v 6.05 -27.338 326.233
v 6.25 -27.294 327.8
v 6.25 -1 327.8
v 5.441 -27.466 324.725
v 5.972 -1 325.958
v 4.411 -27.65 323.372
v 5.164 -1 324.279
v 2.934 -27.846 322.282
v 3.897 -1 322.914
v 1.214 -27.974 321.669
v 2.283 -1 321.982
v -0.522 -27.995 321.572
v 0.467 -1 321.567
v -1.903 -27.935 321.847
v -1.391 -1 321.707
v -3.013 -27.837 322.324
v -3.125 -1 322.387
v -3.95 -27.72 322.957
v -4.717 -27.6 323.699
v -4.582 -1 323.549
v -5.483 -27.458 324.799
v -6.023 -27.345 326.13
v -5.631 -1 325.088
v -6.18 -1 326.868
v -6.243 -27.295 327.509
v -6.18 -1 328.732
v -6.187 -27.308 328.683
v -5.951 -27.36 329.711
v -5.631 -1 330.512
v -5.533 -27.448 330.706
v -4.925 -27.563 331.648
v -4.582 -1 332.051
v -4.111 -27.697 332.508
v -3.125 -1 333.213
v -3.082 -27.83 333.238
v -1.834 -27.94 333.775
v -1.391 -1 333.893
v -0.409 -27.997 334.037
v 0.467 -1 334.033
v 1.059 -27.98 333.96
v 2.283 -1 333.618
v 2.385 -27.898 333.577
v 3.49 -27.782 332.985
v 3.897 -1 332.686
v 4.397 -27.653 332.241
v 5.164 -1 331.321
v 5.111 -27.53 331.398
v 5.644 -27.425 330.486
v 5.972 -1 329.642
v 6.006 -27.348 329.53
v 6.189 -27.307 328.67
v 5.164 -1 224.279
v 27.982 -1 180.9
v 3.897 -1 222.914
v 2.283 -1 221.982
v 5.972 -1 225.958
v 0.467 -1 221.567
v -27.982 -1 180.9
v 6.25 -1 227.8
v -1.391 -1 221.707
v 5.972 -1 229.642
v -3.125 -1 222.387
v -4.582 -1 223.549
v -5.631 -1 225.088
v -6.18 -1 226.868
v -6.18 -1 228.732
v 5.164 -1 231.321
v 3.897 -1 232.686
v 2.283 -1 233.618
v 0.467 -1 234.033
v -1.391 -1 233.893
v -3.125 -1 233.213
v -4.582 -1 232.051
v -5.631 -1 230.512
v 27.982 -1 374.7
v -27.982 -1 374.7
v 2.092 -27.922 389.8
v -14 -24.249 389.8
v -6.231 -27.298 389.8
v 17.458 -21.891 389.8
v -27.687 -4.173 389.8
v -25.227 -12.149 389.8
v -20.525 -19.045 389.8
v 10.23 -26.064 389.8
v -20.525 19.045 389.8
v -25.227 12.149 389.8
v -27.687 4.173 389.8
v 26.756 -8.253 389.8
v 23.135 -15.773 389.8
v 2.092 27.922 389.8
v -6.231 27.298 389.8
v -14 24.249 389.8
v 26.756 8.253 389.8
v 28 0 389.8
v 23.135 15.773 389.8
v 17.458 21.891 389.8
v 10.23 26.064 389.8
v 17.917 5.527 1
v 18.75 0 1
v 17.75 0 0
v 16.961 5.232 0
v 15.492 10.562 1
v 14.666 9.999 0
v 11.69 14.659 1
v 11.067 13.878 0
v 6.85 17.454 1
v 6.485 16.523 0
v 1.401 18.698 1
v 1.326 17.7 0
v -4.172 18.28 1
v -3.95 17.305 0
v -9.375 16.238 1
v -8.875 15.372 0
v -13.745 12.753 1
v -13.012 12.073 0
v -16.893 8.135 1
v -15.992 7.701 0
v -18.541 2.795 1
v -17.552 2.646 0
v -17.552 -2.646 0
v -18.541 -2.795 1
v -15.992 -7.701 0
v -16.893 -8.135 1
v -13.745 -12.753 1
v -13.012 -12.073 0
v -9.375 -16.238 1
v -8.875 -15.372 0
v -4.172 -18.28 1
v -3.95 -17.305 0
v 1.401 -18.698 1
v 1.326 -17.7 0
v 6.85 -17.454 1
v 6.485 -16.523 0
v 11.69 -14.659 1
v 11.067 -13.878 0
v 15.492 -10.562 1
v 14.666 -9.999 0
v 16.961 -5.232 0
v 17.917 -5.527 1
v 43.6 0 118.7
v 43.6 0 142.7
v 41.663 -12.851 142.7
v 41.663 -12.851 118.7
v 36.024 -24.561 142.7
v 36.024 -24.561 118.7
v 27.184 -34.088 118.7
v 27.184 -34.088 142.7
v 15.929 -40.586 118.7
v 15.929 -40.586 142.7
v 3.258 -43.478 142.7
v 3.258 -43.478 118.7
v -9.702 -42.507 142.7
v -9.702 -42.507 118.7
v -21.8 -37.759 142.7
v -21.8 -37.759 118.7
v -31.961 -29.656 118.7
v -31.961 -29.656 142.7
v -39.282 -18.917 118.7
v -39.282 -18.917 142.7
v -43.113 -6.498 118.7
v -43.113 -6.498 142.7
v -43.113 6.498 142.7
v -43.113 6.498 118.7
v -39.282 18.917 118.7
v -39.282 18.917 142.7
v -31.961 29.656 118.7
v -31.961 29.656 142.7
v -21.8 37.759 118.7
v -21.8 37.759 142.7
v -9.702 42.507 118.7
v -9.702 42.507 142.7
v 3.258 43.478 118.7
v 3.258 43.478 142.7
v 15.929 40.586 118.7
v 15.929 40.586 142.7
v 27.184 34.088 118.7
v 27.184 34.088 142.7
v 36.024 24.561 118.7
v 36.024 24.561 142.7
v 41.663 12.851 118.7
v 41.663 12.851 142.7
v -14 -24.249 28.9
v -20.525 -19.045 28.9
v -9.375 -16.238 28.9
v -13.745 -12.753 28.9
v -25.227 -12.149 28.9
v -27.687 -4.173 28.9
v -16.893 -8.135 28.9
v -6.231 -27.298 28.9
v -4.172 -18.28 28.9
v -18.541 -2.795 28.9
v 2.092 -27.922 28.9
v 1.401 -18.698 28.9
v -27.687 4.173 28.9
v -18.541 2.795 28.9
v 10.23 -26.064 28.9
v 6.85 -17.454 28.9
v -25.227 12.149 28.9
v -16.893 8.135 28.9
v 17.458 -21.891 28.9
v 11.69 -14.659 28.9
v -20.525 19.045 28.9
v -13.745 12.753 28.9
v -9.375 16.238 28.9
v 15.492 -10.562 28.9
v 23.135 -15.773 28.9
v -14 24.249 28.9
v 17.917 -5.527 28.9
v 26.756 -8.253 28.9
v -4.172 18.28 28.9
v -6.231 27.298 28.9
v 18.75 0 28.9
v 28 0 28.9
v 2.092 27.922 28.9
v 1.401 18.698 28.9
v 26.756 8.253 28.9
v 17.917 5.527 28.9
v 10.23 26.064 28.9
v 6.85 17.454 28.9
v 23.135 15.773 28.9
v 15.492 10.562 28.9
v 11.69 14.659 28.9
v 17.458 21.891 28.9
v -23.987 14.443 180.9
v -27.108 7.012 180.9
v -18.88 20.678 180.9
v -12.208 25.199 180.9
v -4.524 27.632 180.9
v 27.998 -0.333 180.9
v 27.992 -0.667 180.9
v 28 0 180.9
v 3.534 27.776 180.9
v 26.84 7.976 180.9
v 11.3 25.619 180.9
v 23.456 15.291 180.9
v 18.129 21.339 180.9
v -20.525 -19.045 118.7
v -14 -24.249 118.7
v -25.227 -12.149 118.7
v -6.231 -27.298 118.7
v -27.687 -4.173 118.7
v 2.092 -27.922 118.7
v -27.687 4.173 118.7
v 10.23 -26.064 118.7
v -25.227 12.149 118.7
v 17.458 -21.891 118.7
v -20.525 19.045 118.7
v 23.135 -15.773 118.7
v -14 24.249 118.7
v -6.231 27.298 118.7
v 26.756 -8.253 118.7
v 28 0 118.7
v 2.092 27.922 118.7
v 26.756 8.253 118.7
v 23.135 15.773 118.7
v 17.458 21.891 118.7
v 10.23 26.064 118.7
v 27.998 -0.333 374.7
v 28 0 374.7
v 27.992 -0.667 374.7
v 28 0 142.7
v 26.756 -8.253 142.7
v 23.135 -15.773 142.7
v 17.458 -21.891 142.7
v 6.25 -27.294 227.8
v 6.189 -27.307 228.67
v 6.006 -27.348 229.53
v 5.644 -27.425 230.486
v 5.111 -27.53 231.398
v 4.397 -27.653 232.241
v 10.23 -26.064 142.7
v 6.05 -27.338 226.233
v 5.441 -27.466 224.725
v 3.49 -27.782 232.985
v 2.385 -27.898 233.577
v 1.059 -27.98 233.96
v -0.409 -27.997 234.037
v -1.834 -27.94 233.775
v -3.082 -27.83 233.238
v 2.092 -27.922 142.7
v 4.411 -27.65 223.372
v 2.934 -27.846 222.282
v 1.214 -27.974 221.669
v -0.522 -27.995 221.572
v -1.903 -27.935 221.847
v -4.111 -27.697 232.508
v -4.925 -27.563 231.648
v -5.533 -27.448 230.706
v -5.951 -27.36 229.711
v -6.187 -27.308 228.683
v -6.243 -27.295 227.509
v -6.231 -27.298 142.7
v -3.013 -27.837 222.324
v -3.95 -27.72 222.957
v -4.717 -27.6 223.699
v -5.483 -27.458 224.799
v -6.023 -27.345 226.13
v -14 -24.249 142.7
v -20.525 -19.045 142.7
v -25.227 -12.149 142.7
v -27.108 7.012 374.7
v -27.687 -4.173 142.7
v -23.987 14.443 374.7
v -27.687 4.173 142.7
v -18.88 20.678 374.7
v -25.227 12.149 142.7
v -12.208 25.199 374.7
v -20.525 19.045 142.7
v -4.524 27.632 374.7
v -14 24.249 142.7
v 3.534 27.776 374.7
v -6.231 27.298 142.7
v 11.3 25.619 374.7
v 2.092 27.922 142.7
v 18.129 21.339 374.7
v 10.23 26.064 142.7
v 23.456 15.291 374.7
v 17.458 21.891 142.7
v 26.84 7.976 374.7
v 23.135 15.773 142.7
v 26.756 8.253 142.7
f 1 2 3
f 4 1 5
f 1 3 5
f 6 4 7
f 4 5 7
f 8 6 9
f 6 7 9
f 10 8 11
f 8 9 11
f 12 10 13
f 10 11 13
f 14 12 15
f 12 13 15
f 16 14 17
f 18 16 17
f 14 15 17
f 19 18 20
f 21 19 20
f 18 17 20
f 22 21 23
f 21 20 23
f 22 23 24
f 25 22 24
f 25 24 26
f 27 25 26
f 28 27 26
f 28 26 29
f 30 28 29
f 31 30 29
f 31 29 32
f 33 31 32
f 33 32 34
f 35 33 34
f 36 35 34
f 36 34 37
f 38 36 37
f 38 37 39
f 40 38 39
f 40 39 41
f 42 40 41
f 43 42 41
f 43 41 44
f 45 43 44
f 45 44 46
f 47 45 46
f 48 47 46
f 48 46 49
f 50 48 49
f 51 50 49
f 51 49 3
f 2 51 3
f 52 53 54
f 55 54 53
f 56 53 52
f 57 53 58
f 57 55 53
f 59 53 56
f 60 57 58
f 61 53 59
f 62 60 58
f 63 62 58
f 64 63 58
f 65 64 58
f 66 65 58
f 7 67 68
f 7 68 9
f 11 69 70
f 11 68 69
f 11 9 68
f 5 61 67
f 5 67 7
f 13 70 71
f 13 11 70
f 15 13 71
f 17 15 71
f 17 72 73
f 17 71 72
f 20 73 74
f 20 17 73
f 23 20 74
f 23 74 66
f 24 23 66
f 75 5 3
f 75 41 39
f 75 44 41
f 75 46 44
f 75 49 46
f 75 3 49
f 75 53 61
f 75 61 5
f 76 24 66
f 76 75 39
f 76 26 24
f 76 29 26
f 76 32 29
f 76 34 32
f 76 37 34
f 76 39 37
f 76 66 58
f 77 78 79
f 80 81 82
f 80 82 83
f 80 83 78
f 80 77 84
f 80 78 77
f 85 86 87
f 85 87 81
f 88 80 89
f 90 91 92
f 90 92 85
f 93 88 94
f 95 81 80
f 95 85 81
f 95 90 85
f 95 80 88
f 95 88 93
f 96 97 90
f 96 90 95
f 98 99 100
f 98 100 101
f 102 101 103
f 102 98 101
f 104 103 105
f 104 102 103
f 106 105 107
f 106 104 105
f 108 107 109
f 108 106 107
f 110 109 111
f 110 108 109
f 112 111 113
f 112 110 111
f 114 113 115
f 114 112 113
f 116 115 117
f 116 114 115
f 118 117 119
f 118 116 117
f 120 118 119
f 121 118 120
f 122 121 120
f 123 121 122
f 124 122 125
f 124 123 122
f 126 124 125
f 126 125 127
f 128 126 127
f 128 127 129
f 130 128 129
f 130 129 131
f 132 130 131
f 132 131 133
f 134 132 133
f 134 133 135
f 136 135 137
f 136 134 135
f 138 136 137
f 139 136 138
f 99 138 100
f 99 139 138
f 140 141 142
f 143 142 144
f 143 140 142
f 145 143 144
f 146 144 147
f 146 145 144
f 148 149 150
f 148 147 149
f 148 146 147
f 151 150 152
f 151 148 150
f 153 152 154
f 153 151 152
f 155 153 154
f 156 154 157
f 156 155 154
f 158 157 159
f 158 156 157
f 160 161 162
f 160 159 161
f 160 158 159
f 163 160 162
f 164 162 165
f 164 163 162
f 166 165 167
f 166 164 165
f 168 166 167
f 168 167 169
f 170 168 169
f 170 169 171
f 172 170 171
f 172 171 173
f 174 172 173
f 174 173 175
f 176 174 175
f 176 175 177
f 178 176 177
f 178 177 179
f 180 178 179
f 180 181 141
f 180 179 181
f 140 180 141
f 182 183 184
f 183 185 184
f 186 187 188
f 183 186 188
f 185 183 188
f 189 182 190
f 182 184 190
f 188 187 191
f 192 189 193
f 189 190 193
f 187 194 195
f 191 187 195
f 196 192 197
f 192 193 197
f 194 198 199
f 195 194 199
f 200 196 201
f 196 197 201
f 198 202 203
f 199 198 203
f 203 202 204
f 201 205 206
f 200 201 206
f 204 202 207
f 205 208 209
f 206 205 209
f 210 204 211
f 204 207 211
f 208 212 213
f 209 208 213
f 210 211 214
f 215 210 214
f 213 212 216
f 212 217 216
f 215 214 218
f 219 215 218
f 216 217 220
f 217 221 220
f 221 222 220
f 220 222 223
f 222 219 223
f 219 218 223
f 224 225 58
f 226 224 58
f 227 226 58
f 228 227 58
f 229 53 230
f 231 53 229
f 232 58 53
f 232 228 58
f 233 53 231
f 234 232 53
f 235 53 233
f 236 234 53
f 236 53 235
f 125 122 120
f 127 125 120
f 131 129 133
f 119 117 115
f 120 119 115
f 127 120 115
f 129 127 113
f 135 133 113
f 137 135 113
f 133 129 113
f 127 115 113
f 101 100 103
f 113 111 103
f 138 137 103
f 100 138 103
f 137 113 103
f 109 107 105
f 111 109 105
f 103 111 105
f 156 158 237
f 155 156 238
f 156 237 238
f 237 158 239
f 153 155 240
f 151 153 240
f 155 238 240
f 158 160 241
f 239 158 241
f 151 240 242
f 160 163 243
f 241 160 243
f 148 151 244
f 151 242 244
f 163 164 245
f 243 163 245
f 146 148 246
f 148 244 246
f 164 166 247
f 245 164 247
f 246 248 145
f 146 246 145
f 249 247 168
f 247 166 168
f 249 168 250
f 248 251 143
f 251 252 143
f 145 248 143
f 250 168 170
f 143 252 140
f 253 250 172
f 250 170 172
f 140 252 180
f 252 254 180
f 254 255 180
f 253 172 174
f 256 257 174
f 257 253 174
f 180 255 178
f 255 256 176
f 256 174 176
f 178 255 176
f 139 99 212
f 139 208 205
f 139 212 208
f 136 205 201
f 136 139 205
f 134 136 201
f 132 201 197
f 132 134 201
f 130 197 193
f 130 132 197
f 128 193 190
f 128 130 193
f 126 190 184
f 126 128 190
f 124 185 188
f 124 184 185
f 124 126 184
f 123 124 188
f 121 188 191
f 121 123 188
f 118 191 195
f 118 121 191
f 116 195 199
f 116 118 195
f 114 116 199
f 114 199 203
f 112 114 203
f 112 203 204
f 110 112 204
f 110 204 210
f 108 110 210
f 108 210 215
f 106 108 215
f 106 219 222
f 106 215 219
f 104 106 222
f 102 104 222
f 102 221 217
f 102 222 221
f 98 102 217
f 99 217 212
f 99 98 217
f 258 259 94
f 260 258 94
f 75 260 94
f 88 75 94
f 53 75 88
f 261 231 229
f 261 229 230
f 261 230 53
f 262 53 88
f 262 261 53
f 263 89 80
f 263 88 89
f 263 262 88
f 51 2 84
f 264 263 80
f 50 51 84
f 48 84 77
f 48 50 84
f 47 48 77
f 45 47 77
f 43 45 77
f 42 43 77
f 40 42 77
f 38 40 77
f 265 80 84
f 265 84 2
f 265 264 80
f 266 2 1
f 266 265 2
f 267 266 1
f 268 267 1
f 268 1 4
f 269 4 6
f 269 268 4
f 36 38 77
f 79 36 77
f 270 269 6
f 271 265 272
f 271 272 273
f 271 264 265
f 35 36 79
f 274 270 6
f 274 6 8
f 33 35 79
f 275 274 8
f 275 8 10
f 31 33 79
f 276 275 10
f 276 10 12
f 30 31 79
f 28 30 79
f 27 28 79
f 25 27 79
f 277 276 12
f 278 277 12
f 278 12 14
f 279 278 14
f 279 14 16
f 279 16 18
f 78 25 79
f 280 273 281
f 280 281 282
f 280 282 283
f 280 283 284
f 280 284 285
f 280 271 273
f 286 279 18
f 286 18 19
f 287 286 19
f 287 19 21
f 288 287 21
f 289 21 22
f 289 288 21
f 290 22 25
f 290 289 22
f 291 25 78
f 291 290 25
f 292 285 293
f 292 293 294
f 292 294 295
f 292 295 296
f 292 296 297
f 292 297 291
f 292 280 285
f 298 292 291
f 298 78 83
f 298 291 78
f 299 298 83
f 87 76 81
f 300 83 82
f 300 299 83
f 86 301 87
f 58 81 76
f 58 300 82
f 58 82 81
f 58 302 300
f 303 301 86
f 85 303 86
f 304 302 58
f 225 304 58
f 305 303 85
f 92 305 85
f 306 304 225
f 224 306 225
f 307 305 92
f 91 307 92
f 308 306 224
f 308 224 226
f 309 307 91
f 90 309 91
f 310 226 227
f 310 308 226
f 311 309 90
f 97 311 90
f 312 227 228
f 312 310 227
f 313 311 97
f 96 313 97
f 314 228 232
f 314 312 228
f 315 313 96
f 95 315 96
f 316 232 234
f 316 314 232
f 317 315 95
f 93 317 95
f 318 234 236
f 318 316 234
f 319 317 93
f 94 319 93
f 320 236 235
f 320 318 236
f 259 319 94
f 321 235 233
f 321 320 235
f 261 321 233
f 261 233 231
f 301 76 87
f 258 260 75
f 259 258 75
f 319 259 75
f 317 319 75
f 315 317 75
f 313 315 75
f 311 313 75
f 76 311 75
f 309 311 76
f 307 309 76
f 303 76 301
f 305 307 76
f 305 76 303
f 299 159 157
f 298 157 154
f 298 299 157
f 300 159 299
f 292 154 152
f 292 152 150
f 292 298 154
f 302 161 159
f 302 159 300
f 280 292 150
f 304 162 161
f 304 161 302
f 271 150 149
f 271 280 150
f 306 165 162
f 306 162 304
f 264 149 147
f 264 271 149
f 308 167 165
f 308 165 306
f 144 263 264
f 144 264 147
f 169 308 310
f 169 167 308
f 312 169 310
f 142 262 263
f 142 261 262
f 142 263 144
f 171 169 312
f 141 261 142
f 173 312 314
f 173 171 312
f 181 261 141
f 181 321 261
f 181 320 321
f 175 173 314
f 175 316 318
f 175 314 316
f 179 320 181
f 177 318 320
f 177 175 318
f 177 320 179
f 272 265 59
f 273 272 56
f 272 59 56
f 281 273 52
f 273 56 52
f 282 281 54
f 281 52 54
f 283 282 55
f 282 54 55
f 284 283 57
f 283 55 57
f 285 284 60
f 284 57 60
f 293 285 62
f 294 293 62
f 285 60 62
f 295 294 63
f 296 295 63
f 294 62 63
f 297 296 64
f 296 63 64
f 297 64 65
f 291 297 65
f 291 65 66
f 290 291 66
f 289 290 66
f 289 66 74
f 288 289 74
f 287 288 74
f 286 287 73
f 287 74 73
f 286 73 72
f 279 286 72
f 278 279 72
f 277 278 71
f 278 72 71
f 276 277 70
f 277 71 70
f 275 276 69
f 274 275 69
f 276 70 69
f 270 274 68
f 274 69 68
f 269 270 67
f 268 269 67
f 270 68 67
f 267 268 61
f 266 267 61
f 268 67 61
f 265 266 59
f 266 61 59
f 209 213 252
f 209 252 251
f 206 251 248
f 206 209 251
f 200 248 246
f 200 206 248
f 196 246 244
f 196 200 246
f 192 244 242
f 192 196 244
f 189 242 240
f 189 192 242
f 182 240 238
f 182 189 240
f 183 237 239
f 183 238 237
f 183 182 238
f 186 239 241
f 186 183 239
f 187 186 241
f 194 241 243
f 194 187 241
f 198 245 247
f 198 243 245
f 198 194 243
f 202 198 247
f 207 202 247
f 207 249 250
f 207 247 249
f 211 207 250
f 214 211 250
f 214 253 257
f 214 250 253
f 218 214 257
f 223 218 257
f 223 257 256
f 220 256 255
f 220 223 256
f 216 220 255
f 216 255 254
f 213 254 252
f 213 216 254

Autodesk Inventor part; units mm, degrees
ref_plane "YZ Plane" through (0, 0, 0) normal (1, 0, 0) x (0, 1, 0)
ref_plane "XY Plane" through (0, 0, 0) normal (0, 0, 1) x (1, 0, 0)
sketch "Esboço1" plane through (0, 0, 0) normal (0, 0, 1) x (1, 0, 0)
  circle A0 centre (0, 0) radius 18.75
  dimension "d2" = 37.5
extrude "Extrusão1" add sketch "Esboço1" along normal blind 28.9
sketch "Esboço2" plane through (0, 0, 28.9) normal (0, 0, 1) x (1, 0, 0)
  circle A0 centre (0, 0) radius 28
  dimension "d3" = 56
extrude "Extrusão2" add sketch "Esboço2" along normal blind 89.8
sketch "Esboço3" plane through (0, 0, 118.7) normal (0, 0, 1) x (1, 0, 0)
  circle A0 centre (0, 0) radius 43.6
  dimension "d6" = 87.2
extrude "Extrusão3" add sketch "Esboço3" along normal blind 24
sketch "Esboço4" plane through (0, 0, 142.7) normal (0, 0, 1) x (1, 0, 0)
  circle A0 centre (0, 0) radius 28
  dimension "d9" = 56
extrude "Extrusão4" add sketch "Esboço4" along normal blind 247.1
ref_plane "Plano de trabalho1" through (0, 28, 0) normal (0, 1, 0) x (-1, 0, 0)
sketch "Esboço5" plane through (0, 28, 0) normal (0, 1, 0) x (-1, 0, 0)
  line L0 (86.1192, 180.9) -> (-95.7284, 180.9)
  line L1 (-95.7284, 180.9) -> (-95.7284, 374.7)
  line L2 (-95.7284, 374.7) -> (86.1192, 374.7)
  line L3 (86.1192, 374.7) -> (86.1192, 180.9)
  line L4 (43.6, 142.7) -> (-43.6, 142.7) projected
  point P0 (0, 0)
  dimension "d13" = 193.8
  dimension "d14" = 38.2
extrude "Extrusão5" cut sketch "Esboço5" against normal blind 29
sketch "Esboço6" plane through (0, -1, 0) normal (0, 1, 0) x (1, 0, 0)
  circle A0 centre (0, -227.8) radius 6.25
  circle A1 centre (0, -327.8) radius 6.25
  line L0 (28, -180.9) -> (-28, -180.9) projected
  line L1 (-28, -374.7) -> (28, -374.7) projected
  point P0 (0, 0)
  point P1 (-27.9821, -180.9)
  point P2 (27.9821, -180.9)
  point P3 (27.9821, -374.7)
  point P4 (-27.9821, -374.7)
  dimension "d17" = 12.5
  dimension "d19" = 100
  dimension "d20" = 12.5
  dimension "d21" = 46.9
extrude "Extrusão6" cut sketch "Esboço6" against normal up to next
chamfer "Chanfro1" distance 1 angle 45 1 edges at (-18.75, 0, 0)
properties part number "eixo da Valvula"
